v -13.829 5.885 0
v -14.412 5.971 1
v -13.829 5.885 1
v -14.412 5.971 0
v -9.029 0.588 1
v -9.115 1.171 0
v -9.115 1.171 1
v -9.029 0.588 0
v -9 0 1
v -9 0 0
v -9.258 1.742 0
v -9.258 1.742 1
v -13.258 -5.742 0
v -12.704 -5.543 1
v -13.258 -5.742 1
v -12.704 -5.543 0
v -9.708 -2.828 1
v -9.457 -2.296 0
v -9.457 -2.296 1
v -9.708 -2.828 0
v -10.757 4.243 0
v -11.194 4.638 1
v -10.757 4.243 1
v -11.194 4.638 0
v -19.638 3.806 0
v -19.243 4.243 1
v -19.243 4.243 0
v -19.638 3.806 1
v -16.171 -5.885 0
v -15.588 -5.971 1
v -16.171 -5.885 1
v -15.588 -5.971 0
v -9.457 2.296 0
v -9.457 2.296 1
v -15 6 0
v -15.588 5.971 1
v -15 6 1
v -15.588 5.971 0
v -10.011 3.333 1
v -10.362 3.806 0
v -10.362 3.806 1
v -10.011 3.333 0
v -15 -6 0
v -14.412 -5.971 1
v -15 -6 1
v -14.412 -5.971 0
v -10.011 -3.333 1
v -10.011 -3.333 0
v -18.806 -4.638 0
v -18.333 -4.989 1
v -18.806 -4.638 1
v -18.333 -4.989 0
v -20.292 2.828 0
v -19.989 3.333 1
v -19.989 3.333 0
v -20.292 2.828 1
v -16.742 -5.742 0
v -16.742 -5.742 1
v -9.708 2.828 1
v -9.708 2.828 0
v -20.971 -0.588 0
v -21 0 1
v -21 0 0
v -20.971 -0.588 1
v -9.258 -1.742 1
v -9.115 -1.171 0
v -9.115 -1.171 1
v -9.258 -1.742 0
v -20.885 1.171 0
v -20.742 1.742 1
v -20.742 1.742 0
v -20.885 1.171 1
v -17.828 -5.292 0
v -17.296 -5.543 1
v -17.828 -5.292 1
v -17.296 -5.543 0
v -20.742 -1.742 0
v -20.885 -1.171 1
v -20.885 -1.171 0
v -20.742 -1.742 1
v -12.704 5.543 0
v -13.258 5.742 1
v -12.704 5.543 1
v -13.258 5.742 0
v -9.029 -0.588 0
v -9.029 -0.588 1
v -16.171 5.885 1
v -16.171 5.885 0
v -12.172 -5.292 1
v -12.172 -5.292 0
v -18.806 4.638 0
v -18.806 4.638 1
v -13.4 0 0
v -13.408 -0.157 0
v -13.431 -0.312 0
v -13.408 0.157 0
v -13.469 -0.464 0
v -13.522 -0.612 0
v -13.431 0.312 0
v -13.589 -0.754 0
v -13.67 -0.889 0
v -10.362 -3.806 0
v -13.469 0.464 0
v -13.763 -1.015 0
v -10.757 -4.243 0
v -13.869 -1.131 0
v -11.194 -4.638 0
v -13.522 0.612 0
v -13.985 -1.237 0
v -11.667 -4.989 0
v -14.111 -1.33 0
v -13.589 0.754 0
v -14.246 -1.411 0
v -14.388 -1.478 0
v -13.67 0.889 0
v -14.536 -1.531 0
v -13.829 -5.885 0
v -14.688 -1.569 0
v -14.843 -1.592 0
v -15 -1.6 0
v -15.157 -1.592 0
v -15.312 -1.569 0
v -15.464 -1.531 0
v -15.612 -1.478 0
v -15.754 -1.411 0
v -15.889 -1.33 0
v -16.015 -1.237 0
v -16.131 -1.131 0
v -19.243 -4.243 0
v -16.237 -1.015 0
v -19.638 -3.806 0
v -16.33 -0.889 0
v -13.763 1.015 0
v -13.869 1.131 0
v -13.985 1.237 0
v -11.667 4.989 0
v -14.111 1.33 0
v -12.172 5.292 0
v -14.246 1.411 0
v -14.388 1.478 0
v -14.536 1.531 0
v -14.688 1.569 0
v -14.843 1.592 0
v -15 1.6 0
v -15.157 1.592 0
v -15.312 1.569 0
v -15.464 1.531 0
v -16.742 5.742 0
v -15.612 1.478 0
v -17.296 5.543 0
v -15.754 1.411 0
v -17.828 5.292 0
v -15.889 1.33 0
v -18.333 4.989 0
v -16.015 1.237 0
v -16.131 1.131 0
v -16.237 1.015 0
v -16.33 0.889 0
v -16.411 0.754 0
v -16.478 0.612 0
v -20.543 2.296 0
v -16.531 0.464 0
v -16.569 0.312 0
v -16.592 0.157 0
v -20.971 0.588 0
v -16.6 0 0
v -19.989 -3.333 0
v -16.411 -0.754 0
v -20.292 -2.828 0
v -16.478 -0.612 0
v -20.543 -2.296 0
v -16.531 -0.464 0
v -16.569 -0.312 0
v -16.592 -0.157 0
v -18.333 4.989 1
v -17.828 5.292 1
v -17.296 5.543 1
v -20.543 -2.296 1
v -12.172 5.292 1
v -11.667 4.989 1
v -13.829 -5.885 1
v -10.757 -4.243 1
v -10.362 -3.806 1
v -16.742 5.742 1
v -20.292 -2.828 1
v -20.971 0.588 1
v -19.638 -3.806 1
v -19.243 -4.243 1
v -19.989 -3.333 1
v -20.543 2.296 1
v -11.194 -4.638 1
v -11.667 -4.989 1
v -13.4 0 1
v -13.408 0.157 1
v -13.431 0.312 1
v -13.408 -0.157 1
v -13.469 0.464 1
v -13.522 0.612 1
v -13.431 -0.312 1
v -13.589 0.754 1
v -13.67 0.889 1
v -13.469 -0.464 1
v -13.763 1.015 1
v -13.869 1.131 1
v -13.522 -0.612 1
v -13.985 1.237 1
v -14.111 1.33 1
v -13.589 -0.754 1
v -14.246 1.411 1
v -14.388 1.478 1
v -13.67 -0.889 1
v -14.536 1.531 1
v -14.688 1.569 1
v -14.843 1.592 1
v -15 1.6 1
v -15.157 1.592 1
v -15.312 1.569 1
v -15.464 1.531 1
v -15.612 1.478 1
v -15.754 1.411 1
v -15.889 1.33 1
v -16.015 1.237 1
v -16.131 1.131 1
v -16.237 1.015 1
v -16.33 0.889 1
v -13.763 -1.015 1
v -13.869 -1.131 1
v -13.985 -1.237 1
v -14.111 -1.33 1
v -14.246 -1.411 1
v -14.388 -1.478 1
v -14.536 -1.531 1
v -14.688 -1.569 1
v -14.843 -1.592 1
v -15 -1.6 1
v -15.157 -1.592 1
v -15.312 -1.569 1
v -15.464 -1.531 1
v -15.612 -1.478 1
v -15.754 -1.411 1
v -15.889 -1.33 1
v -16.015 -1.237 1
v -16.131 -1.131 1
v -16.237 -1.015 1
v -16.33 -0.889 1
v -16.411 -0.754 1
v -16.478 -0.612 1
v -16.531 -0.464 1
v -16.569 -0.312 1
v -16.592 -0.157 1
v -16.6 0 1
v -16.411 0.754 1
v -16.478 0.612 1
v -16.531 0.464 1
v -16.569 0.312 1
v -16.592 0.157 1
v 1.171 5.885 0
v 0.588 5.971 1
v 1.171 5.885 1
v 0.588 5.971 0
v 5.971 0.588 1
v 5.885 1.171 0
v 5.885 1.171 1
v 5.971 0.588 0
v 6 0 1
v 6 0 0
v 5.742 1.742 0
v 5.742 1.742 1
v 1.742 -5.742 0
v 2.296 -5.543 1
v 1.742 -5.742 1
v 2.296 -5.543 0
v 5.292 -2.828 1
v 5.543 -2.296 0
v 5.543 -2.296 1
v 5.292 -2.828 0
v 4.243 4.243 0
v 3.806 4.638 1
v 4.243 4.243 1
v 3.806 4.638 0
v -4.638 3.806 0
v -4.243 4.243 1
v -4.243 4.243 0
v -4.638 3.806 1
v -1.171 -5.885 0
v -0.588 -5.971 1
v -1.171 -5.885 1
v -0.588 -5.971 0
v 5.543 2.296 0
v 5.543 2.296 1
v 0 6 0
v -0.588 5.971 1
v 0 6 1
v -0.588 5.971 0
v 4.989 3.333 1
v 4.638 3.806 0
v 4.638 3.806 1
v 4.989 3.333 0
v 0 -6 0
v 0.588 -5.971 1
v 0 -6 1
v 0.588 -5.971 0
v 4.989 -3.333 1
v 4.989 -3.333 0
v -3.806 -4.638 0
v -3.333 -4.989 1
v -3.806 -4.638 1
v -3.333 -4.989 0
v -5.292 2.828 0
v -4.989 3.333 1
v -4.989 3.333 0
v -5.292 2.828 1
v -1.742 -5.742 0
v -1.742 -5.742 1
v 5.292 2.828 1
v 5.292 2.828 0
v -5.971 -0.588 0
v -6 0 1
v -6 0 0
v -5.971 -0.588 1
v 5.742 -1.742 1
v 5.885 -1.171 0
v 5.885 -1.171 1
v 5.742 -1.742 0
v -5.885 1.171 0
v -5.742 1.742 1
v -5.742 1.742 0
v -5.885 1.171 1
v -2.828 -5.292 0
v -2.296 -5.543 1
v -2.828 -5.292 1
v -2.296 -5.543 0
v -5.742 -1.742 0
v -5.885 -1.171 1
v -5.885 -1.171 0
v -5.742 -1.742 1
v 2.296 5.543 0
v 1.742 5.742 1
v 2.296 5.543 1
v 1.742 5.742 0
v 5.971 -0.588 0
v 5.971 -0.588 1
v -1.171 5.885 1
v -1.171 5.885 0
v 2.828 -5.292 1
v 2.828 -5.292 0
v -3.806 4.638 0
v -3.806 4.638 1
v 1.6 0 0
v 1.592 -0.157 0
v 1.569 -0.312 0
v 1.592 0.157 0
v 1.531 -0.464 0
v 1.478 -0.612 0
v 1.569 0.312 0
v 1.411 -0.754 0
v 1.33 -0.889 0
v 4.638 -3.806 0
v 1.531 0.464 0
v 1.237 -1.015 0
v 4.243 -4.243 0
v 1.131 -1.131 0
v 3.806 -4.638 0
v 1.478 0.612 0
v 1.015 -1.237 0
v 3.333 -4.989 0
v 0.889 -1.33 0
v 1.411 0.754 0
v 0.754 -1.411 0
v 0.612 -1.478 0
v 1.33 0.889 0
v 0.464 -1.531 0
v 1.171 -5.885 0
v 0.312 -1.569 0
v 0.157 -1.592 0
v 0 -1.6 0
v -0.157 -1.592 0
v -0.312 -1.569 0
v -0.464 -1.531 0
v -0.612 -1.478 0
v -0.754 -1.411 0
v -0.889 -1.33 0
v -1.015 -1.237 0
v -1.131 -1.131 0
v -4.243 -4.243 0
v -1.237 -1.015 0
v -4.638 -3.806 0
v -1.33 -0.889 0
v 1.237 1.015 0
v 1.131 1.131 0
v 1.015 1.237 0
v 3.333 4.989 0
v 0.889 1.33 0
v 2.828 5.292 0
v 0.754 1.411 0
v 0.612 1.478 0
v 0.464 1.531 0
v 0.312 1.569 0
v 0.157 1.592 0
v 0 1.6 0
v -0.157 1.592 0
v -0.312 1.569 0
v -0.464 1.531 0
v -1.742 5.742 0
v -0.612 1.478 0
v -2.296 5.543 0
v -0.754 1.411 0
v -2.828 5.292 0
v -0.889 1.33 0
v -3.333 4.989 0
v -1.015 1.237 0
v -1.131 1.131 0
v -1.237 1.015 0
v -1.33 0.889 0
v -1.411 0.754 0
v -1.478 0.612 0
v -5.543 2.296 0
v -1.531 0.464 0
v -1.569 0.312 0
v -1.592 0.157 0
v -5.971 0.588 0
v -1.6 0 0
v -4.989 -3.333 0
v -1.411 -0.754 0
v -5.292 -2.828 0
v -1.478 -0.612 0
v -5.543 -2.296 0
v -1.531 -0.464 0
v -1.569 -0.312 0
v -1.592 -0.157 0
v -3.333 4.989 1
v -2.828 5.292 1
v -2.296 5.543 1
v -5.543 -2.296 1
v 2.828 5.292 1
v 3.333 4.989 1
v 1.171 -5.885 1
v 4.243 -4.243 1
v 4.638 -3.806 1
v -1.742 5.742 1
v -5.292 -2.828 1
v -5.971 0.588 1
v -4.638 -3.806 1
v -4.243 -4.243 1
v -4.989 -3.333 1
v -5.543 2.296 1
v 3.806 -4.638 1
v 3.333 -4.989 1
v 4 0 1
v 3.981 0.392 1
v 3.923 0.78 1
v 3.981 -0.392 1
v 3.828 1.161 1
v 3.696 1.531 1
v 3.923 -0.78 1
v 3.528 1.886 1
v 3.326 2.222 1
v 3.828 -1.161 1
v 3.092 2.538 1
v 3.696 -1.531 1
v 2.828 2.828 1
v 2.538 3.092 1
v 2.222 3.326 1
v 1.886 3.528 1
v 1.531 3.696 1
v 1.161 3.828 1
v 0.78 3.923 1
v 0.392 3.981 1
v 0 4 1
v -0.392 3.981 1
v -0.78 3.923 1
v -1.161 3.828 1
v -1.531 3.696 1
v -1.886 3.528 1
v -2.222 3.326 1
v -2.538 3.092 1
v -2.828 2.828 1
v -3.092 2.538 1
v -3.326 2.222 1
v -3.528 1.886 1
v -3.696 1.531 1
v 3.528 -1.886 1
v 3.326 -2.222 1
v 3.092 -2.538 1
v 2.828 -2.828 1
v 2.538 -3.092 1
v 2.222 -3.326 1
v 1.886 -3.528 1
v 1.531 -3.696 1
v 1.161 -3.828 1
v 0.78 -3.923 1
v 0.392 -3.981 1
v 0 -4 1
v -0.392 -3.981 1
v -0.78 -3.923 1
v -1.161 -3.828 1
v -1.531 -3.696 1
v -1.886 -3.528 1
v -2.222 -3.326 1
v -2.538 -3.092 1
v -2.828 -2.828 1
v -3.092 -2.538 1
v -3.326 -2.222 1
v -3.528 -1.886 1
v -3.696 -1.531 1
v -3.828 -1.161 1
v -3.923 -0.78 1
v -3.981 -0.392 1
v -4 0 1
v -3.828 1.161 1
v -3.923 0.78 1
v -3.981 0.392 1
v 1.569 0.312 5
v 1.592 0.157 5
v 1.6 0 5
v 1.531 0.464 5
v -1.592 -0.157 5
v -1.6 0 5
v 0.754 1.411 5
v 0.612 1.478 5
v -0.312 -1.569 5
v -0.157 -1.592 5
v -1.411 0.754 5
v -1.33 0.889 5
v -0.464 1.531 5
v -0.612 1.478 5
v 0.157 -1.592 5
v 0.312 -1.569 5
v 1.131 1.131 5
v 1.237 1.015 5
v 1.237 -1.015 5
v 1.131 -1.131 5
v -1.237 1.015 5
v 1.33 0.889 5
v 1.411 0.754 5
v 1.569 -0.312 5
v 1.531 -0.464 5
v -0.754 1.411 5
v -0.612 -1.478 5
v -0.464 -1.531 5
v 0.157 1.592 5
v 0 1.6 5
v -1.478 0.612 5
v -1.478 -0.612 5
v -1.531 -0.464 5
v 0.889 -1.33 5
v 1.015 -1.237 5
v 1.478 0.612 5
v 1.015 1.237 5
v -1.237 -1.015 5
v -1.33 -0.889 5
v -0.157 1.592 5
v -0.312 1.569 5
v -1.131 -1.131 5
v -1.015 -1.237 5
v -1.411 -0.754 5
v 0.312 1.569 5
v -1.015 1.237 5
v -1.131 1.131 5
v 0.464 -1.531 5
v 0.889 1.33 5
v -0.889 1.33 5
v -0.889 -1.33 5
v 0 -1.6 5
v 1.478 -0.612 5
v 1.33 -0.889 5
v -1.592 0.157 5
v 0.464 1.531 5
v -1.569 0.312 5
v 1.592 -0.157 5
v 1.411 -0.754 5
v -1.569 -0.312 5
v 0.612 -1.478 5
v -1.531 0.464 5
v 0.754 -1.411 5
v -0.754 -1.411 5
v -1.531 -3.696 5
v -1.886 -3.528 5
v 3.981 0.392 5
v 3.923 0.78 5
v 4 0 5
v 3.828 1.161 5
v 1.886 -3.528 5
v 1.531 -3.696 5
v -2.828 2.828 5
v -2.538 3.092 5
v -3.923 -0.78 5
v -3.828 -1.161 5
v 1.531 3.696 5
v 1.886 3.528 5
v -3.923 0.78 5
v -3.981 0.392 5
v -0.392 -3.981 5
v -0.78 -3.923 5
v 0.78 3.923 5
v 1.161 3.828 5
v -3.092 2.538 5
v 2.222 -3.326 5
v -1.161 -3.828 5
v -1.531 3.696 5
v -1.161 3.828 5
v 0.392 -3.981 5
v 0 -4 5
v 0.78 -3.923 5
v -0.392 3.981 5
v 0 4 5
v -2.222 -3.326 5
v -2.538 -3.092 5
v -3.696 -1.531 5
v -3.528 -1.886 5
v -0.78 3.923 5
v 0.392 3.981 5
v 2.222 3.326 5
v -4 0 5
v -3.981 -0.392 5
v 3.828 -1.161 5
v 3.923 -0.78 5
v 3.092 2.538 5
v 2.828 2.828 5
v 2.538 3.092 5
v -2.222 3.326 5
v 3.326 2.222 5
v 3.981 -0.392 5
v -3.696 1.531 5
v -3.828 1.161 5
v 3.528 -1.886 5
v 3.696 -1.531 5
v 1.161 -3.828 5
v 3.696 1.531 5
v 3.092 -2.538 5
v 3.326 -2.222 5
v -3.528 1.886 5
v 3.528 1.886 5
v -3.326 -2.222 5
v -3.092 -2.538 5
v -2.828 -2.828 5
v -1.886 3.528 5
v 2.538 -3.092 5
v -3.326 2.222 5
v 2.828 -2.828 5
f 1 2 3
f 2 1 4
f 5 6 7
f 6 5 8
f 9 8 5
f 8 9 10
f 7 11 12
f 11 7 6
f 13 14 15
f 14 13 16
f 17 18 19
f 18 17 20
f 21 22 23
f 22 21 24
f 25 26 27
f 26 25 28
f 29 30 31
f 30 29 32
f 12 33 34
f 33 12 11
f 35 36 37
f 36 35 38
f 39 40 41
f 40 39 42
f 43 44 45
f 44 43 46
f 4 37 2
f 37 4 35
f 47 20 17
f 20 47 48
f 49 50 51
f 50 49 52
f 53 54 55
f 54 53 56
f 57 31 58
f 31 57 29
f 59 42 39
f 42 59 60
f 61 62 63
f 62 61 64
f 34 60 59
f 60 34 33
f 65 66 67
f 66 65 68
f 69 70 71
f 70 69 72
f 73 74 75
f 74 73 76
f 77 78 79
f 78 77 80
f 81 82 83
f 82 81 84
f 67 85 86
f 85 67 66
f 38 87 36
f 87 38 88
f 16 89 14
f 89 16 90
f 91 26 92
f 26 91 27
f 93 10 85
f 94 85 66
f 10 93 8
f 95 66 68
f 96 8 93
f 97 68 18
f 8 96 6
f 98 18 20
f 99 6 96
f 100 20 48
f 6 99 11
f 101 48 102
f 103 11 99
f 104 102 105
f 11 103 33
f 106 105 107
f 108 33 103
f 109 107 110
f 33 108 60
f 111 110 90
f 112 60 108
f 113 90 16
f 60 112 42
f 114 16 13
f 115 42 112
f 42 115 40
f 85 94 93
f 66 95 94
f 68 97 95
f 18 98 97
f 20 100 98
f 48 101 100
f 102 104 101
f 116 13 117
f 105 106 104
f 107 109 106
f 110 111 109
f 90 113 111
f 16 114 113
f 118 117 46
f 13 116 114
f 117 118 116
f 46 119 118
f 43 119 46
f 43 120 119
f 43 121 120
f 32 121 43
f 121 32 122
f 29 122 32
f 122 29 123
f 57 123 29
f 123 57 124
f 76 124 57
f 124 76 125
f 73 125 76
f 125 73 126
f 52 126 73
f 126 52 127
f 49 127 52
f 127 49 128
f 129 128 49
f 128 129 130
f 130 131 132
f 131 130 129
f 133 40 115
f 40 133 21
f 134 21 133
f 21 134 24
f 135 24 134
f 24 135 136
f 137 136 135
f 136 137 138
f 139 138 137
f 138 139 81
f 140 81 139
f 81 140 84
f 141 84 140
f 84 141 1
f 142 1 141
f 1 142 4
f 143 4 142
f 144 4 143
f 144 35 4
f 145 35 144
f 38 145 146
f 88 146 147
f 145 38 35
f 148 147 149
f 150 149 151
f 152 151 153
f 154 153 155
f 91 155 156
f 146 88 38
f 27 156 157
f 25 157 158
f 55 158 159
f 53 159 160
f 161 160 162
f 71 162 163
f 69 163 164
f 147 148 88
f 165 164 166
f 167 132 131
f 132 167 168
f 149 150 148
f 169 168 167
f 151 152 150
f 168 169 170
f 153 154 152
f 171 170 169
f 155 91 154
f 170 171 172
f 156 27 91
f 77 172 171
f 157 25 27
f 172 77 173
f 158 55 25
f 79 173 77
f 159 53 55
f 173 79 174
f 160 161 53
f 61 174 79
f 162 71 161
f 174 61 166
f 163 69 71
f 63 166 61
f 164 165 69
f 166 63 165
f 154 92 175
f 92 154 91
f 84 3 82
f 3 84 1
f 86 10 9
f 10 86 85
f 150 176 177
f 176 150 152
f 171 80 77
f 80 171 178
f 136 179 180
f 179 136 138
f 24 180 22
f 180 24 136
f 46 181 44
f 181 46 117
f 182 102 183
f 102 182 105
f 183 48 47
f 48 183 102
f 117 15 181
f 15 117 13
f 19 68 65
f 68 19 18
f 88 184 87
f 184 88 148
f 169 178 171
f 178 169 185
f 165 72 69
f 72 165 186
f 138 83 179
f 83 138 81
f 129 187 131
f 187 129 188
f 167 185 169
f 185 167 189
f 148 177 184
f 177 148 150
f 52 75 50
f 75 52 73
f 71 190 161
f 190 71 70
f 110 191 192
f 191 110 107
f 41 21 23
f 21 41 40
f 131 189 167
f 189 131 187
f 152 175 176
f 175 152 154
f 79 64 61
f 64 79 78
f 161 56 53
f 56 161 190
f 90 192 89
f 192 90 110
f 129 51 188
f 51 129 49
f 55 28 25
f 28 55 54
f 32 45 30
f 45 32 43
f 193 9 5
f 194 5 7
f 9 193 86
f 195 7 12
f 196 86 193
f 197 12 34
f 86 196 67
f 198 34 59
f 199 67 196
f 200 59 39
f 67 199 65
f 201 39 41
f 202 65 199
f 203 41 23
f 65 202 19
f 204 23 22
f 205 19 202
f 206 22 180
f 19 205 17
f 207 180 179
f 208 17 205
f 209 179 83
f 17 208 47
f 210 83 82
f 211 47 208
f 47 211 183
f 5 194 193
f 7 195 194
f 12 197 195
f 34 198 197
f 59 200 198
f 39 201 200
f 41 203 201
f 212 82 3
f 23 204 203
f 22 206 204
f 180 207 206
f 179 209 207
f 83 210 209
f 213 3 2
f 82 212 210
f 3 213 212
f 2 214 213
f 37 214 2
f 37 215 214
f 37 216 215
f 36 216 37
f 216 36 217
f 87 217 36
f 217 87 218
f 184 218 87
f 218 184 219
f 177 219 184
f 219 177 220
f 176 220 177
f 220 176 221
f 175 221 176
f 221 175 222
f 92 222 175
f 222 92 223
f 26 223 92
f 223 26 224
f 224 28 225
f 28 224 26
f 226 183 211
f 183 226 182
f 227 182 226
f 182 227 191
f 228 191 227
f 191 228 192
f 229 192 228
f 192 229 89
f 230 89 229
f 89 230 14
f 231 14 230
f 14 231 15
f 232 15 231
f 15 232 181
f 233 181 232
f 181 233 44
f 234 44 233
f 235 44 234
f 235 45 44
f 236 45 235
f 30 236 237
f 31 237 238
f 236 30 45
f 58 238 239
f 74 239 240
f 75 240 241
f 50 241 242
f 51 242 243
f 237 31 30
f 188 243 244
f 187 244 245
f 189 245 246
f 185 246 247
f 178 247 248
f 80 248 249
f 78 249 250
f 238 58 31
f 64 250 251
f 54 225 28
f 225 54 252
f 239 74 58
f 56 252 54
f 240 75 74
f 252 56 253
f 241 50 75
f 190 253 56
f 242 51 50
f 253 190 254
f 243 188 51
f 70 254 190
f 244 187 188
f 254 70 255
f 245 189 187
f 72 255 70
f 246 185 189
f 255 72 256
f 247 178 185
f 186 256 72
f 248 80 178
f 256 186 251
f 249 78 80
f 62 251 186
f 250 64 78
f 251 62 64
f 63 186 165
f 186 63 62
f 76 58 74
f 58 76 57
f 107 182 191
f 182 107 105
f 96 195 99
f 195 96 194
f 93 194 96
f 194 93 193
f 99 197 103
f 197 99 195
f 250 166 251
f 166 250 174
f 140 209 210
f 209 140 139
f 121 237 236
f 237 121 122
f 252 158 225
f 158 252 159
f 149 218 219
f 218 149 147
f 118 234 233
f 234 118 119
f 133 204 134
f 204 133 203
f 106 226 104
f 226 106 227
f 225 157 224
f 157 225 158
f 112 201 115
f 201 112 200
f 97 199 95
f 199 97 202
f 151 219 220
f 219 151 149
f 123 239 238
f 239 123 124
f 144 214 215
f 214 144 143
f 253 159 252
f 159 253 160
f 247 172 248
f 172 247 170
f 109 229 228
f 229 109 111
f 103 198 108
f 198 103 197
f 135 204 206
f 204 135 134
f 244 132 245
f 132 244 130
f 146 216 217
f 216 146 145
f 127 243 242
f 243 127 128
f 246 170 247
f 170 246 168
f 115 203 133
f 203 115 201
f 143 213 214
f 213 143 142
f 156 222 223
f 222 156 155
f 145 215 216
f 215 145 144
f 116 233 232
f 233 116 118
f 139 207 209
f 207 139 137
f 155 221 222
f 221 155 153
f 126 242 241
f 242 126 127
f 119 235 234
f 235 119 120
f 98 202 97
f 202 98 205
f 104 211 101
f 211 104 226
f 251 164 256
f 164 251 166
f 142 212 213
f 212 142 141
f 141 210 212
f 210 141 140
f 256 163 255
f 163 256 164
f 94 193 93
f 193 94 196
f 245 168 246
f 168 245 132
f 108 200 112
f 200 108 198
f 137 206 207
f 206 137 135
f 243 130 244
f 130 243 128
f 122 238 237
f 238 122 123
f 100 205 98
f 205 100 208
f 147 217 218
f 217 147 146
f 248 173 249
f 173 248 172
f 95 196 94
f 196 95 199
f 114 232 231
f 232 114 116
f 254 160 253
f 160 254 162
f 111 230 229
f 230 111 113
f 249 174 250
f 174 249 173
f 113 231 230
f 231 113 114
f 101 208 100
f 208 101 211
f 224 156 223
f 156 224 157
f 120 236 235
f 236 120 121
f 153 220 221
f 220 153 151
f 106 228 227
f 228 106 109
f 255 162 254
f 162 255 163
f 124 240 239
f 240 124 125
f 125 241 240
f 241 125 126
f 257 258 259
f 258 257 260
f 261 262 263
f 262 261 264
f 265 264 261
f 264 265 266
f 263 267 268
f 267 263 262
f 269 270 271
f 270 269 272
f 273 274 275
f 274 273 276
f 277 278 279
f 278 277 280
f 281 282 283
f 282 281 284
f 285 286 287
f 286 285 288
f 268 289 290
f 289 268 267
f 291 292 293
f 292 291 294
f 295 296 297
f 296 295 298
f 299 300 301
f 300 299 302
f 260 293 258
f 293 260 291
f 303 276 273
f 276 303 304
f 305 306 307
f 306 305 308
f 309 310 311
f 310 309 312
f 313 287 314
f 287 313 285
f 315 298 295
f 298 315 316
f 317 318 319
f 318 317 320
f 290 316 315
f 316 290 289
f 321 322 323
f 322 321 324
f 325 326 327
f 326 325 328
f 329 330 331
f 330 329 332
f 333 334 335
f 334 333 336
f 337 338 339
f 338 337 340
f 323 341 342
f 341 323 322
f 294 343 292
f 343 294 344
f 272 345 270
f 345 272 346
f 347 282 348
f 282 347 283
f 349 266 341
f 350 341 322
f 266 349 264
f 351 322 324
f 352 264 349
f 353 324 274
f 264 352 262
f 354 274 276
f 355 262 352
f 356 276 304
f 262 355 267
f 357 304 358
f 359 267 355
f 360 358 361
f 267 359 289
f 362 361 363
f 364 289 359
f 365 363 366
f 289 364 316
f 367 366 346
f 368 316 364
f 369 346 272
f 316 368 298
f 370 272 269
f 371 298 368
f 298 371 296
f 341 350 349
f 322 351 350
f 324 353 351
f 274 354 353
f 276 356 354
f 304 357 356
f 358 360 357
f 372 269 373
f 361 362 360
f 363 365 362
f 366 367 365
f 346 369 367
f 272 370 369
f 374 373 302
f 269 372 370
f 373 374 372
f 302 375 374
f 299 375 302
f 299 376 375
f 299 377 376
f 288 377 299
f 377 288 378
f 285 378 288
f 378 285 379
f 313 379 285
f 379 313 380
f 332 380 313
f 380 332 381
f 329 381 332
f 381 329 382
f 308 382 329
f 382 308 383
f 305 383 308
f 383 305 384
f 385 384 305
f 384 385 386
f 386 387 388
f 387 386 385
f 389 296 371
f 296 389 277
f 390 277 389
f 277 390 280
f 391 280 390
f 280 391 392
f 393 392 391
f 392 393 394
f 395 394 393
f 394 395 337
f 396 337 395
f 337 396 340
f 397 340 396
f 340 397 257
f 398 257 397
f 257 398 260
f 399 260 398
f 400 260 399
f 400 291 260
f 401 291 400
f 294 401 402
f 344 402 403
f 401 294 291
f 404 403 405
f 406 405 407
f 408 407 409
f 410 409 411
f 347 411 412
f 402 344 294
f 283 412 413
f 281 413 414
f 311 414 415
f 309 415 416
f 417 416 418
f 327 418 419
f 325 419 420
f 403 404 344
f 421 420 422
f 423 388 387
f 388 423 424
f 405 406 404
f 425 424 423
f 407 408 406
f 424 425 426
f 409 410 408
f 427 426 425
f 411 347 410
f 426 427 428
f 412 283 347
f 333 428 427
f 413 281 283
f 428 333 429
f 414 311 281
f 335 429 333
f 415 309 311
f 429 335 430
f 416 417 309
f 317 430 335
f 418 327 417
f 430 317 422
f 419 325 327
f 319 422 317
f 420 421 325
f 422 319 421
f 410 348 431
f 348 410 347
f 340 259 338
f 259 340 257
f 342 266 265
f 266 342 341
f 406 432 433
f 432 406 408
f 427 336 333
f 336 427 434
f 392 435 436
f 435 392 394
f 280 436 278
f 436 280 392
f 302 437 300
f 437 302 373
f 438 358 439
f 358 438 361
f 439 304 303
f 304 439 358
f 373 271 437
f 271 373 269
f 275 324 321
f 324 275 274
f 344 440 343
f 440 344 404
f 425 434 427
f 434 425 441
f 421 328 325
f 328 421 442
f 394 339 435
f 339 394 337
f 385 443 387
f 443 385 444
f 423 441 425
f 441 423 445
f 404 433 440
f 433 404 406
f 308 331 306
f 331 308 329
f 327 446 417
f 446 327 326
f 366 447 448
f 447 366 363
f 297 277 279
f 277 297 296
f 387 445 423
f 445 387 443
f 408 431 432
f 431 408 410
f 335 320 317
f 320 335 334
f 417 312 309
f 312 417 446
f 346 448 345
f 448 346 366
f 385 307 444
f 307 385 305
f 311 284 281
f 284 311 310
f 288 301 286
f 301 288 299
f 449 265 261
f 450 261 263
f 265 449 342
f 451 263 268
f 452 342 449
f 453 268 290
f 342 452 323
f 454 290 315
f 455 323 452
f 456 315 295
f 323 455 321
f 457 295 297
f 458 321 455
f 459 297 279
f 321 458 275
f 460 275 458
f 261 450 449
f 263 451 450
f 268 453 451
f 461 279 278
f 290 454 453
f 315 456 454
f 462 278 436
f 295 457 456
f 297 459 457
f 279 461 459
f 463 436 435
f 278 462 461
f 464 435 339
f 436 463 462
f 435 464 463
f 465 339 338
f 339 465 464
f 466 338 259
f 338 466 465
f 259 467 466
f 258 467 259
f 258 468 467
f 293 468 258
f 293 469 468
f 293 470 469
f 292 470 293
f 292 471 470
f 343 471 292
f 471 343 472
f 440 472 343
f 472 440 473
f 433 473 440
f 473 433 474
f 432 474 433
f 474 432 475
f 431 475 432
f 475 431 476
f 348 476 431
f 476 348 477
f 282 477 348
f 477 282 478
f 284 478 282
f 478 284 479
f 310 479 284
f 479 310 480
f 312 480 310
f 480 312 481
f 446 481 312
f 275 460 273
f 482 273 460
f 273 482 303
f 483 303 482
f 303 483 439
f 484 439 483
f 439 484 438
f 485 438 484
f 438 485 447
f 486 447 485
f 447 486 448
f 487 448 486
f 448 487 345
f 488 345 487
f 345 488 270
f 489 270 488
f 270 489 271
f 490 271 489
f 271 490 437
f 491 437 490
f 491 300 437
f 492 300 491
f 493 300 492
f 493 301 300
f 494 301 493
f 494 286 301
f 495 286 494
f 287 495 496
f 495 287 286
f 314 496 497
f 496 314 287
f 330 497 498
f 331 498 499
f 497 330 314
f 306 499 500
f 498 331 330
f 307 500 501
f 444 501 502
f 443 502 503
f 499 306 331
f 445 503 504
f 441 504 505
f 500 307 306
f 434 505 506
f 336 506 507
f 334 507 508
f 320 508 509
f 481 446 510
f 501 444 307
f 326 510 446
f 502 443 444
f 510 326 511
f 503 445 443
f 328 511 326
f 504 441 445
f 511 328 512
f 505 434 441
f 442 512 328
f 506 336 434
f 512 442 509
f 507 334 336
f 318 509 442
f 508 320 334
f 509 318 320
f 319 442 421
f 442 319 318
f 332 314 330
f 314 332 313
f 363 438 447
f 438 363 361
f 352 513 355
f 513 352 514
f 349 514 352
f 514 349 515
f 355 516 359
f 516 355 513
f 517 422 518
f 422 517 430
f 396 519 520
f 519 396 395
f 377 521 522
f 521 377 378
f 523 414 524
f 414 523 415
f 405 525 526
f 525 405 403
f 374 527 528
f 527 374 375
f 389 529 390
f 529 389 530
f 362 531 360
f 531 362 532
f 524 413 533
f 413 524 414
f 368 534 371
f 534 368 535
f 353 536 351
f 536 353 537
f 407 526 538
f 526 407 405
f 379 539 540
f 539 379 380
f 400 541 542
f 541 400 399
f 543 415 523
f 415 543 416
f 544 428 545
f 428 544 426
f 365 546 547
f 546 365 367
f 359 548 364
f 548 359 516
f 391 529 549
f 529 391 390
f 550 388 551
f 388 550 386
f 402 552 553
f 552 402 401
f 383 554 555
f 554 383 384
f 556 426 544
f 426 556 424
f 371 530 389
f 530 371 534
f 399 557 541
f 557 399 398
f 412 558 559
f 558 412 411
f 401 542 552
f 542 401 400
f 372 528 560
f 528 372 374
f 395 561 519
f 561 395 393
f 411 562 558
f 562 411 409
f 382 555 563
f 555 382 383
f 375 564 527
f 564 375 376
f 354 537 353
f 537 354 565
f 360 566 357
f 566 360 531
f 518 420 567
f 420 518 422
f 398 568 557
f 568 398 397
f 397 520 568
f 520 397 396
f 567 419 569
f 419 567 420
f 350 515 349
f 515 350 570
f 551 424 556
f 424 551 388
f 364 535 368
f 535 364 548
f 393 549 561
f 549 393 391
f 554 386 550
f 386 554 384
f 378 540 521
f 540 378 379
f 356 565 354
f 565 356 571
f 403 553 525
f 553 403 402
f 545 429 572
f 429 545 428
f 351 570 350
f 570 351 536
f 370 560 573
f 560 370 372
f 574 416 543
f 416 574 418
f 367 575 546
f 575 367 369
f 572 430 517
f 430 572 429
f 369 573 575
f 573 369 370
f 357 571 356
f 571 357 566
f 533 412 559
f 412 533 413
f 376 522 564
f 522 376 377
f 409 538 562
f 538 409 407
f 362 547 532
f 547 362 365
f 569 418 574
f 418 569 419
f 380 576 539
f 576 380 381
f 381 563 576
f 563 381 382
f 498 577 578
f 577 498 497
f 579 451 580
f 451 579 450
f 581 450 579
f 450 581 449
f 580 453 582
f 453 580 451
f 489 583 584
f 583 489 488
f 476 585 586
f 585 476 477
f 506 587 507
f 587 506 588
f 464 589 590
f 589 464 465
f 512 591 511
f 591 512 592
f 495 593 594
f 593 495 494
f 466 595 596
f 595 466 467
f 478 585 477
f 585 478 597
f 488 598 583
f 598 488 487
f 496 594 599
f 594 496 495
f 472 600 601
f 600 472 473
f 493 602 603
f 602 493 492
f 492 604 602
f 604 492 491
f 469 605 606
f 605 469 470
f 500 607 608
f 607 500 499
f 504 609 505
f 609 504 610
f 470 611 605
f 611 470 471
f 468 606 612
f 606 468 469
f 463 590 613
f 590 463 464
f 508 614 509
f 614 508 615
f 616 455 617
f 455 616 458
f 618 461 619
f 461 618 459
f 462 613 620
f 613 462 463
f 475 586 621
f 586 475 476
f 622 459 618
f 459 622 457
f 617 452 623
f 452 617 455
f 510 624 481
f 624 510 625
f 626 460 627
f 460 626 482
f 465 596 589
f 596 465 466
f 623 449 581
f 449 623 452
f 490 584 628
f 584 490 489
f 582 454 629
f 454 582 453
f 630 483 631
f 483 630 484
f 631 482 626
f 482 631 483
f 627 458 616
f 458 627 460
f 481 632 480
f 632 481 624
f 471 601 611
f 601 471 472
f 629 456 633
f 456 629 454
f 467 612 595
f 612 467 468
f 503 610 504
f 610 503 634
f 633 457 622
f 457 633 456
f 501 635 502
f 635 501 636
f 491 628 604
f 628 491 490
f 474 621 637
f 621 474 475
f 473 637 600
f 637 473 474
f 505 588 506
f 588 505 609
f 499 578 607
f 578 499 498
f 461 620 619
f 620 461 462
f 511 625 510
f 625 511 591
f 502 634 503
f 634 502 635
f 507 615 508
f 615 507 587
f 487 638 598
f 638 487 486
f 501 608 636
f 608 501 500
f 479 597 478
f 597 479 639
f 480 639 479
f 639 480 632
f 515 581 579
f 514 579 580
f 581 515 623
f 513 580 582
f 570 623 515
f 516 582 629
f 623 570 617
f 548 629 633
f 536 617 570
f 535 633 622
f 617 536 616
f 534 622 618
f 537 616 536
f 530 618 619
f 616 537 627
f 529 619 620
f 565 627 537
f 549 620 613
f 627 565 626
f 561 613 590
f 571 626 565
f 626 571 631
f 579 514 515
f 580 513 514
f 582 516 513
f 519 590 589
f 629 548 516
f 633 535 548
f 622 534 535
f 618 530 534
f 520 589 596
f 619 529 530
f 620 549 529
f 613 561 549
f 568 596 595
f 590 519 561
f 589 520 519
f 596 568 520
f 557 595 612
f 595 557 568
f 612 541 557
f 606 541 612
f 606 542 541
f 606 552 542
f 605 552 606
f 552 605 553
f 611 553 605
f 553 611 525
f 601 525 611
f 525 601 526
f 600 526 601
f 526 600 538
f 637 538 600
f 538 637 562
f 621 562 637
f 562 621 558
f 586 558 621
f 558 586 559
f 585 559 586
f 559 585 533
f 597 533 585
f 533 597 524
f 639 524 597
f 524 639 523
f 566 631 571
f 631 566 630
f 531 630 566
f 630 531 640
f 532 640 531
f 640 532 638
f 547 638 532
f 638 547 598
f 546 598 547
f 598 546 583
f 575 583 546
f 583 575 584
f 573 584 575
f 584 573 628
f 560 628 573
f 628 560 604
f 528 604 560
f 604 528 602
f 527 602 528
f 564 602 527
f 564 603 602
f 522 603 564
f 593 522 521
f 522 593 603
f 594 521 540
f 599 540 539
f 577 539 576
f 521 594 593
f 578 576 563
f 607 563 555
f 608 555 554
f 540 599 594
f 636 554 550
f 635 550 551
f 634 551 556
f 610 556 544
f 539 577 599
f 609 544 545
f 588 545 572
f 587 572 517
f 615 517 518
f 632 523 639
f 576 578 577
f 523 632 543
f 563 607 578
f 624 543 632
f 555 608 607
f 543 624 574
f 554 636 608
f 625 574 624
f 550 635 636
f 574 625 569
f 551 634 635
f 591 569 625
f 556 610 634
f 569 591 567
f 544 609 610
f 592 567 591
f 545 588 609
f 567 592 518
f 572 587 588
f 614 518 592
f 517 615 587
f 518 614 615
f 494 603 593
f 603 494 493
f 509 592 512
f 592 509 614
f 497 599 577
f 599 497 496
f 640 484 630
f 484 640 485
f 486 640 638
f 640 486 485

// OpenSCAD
/* BandMate Project, rod_mount.scad
 * rod_mount.scad by Oskari Rundgren is licensed under the
 * Creative Commons Attribution-ShareAlike 4.0 International License.
 */

$fn = 64;

translate([-15,0,0]) washer(height=1, r1=1.6, r2=6);
translate([0,0,0]) washer(height=1, r1=1.6, r2=6);
translate([0,0,1]) washer(height=4, r1=1.6, r2=4);


module washer(height, r1, r2)
{
  difference()
  {
    cylinder(h=height, r=r2);
    cylinder(h=height, r=r1);
  }
}
